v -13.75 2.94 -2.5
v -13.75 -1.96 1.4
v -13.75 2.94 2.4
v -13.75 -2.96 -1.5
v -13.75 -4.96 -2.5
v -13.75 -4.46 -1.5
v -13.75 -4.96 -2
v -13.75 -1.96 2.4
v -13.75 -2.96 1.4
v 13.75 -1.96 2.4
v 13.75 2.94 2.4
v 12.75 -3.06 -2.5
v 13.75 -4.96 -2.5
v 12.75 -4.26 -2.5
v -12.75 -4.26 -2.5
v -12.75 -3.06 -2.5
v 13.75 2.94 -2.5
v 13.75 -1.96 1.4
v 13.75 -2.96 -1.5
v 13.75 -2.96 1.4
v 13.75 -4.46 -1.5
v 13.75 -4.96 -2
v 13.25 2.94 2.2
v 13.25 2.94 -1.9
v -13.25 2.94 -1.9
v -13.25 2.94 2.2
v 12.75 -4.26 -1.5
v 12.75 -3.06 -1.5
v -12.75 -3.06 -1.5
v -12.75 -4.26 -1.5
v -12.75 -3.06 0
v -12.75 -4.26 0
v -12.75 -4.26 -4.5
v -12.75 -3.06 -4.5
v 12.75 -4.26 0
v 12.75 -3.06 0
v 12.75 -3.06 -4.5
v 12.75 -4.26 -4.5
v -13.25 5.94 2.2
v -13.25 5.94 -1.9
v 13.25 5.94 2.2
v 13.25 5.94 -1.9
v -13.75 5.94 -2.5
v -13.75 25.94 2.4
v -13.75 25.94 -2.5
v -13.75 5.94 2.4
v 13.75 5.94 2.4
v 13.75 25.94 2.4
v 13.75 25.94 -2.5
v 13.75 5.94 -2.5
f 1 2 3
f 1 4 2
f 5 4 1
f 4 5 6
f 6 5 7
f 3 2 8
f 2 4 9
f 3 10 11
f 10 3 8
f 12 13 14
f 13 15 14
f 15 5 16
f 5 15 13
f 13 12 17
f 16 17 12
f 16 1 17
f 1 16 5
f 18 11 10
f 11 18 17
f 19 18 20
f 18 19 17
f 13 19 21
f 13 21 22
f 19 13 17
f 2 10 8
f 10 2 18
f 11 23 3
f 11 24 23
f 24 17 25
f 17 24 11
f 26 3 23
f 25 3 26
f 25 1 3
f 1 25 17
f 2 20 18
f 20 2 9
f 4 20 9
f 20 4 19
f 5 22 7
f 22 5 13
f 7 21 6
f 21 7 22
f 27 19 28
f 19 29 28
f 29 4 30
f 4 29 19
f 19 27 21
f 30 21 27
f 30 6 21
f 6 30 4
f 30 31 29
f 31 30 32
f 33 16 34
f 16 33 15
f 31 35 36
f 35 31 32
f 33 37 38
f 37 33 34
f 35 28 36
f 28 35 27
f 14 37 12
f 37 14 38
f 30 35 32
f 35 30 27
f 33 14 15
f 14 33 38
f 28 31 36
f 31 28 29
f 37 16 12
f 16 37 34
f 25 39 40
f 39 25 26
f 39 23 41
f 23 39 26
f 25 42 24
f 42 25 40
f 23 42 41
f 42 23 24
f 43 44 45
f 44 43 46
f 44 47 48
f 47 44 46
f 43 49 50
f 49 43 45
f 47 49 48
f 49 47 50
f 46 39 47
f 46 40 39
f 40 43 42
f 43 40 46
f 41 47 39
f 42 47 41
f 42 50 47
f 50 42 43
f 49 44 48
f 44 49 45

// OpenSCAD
N=10;
A=2.5+N*2.5;
rotate([0,0,180])
translate([-A/2,-2.94,-2.5])
{
	cube([A,4.9,4.9]);
	cube([A,5.9,3.9]);
	hull()
	{
		cube([A,7.4,1]);
		cube([A,7.9,0.5]);
	}
	translate([1,6,-2])cube([A-2,1.2,4.5]); // Assumes cropped pins
	// Plug
	translate([0.5,-20,0.6])cube([A-1,21,4.1]);
	translate([0,-23,0])cube([A,20,4.9]);
}
